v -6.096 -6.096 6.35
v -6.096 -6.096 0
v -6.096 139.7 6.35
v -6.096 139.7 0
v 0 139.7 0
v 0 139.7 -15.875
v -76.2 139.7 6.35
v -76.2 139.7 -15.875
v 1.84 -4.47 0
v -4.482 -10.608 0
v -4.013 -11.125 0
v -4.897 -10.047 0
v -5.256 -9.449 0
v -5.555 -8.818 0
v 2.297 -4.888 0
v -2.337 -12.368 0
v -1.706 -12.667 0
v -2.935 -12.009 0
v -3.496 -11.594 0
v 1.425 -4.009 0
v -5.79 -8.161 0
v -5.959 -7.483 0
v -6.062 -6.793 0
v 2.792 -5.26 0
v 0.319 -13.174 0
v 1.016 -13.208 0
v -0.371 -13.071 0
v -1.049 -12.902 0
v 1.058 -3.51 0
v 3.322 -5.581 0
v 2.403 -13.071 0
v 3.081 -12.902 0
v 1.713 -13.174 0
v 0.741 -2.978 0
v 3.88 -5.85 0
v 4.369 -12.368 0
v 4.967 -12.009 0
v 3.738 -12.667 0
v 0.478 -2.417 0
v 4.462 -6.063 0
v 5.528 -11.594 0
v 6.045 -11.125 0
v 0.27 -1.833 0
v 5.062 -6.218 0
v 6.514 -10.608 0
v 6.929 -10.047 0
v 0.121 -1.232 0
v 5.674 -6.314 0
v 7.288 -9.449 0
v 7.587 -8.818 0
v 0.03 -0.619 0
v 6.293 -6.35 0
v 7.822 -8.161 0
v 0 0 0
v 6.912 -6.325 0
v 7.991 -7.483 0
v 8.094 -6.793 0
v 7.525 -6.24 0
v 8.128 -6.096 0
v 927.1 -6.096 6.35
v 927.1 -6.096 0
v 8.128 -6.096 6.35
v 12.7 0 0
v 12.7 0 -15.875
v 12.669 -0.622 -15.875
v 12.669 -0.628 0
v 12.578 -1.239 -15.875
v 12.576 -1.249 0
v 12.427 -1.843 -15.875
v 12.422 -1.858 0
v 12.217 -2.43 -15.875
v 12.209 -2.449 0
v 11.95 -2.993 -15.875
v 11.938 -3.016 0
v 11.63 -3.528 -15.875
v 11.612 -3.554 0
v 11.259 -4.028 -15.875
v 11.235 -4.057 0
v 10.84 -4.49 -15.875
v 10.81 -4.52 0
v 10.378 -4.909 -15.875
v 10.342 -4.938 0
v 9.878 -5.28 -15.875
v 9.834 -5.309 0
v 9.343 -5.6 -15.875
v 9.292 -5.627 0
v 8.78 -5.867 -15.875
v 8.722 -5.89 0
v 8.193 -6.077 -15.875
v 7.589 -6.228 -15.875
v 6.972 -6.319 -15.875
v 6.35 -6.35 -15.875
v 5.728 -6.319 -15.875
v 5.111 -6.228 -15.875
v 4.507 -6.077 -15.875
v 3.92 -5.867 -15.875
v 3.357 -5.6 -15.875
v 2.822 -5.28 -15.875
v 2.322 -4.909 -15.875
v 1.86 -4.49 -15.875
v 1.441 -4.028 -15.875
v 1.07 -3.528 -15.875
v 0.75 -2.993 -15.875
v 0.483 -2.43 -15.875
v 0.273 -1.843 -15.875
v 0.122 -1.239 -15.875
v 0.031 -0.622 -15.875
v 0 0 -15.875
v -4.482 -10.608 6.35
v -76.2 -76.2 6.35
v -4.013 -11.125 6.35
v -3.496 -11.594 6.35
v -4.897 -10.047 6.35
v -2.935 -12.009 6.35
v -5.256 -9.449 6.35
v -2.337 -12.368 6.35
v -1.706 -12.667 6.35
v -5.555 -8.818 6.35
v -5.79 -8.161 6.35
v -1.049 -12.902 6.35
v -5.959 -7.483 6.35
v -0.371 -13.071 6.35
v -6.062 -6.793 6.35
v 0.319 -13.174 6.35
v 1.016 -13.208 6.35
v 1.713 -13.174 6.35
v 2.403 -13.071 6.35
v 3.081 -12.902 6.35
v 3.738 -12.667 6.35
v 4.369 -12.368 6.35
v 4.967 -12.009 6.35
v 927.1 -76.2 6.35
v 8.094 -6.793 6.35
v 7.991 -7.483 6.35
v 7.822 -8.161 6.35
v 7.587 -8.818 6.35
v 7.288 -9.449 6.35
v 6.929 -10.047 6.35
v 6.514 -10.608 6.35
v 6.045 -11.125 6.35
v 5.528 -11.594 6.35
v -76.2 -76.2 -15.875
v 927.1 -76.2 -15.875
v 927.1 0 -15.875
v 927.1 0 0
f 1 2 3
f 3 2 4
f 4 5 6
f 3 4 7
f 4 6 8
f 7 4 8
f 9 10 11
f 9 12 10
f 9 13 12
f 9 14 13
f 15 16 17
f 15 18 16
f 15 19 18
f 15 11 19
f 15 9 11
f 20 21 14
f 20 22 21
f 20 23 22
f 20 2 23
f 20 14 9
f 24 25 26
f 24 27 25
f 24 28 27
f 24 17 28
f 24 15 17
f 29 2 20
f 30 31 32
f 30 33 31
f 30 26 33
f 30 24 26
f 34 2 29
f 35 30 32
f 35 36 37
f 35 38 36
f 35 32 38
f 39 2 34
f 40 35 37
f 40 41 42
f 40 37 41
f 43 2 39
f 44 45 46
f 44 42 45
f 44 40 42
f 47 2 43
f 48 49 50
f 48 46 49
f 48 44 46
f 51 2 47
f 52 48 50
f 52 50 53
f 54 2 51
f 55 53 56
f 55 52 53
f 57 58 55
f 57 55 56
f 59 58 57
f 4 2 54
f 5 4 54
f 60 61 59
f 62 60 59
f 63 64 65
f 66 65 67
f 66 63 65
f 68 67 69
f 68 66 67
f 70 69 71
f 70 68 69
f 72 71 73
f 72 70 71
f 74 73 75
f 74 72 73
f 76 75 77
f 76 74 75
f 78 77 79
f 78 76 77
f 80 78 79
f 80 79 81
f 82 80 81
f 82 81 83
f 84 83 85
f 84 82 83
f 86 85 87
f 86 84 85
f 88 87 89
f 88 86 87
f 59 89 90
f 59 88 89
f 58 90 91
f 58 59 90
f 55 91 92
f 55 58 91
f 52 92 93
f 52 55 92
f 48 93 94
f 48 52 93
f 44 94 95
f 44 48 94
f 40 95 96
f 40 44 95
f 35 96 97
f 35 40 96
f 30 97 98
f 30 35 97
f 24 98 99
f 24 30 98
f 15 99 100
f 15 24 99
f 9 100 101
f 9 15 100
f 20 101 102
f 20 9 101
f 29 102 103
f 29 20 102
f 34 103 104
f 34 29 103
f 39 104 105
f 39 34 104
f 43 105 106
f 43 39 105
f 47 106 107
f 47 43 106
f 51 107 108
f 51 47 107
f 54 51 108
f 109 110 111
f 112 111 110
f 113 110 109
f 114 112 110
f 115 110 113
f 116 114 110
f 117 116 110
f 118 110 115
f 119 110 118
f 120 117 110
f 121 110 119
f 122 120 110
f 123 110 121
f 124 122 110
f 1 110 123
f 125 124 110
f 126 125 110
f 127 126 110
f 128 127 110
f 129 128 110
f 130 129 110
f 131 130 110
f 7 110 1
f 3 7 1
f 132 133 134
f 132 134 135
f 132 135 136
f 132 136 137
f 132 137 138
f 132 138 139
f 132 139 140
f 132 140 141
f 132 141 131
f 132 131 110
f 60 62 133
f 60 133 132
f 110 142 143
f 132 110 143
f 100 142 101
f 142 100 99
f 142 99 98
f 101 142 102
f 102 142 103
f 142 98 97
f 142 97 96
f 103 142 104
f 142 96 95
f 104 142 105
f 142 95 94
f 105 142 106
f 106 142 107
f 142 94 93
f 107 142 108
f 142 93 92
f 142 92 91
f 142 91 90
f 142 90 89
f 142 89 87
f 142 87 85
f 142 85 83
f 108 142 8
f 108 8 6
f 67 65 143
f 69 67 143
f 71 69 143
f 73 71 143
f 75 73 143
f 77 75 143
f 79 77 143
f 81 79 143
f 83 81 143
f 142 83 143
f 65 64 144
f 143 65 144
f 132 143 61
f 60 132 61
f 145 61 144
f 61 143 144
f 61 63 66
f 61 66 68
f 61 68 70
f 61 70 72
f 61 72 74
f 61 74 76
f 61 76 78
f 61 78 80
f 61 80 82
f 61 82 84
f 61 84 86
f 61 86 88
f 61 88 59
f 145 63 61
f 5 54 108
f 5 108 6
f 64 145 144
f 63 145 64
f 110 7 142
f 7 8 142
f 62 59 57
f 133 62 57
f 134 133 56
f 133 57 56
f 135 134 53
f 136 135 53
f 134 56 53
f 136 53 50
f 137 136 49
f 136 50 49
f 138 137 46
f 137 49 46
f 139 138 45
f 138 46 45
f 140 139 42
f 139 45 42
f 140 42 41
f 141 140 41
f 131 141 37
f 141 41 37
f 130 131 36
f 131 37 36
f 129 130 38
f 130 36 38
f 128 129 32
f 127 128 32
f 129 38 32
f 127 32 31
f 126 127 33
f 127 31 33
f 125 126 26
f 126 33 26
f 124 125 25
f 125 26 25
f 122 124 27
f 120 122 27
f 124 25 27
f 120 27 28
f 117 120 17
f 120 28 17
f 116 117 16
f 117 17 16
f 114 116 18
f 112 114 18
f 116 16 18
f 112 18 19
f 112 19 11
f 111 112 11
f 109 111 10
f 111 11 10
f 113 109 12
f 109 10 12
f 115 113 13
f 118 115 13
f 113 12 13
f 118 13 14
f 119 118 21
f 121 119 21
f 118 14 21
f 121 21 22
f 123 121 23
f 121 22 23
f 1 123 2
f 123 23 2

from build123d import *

# Parameters (mm, degrees)
F1_DEPTH = 15.875
F2_DEPTH = 6.35


# Not quite as in the source:
# - a length typed as a fraction of an inch, garbled in the dataset ("3 / 203.2 mm" for 3/8 in), is restored


with BuildPart() as f1:
    # F0 (on Top) → F1 (new body)
    with BuildSketch(Plane.XY):
        with BuildLine():
            Line((927.1, 0), (12.7, 0))
            ThreePointArc((12.7, 0), (11.43, -3.81), (8.128, -6.096))
            Line((8.128, -6.096), (927.1, -6.096))
            Line((927.1, -6.096), (927.1, 0))
        make_face()
        with BuildLine():
            Line((927.1, -6.096), (8.128, -6.096))
            ThreePointArc((8.128, -6.096), (1.016, -13.208), (-6.096, -6.096))
            Line((-6.096, -6.096), (-6.096, 139.7))
            Line((-6.096, 139.7), (-76.2, 139.7))
            Line((-76.2, 139.7), (-76.2, -76.2))
            Line((-76.2, -76.2), (927.1, -76.2))
            Line((927.1, -76.2), (927.1, -6.096))
        make_face()
        with BuildLine():
            ThreePointArc((-6.096, -6.096), (1.016, -13.208), (8.128, -6.096))
            ThreePointArc((8.128, -6.096), (2.54, -5.08), (0, 0))
            Line((0, 0), (0, 139.7))
            Line((0, 139.7), (-6.096, 139.7))
            Line((-6.096, 139.7), (-6.096, -6.096))
        make_face()
    extrude(amount=-F1_DEPTH)

    # F0 (on Top) → F2 (join)
    with BuildSketch(Plane.XY):
        with BuildLine():
            Line((927.1, -6.096), (8.128, -6.096))
            ThreePointArc((8.128, -6.096), (1.016, -13.208), (-6.096, -6.096))
            Line((-6.096, -6.096), (-6.096, 139.7))
            Line((-6.096, 139.7), (-76.2, 139.7))
            Line((-76.2, 139.7), (-76.2, -76.2))
            Line((-76.2, -76.2), (927.1, -76.2))
            Line((927.1, -76.2), (927.1, -6.096))
        make_face()
    extrude(amount=F2_DEPTH)


solid = f1.part
